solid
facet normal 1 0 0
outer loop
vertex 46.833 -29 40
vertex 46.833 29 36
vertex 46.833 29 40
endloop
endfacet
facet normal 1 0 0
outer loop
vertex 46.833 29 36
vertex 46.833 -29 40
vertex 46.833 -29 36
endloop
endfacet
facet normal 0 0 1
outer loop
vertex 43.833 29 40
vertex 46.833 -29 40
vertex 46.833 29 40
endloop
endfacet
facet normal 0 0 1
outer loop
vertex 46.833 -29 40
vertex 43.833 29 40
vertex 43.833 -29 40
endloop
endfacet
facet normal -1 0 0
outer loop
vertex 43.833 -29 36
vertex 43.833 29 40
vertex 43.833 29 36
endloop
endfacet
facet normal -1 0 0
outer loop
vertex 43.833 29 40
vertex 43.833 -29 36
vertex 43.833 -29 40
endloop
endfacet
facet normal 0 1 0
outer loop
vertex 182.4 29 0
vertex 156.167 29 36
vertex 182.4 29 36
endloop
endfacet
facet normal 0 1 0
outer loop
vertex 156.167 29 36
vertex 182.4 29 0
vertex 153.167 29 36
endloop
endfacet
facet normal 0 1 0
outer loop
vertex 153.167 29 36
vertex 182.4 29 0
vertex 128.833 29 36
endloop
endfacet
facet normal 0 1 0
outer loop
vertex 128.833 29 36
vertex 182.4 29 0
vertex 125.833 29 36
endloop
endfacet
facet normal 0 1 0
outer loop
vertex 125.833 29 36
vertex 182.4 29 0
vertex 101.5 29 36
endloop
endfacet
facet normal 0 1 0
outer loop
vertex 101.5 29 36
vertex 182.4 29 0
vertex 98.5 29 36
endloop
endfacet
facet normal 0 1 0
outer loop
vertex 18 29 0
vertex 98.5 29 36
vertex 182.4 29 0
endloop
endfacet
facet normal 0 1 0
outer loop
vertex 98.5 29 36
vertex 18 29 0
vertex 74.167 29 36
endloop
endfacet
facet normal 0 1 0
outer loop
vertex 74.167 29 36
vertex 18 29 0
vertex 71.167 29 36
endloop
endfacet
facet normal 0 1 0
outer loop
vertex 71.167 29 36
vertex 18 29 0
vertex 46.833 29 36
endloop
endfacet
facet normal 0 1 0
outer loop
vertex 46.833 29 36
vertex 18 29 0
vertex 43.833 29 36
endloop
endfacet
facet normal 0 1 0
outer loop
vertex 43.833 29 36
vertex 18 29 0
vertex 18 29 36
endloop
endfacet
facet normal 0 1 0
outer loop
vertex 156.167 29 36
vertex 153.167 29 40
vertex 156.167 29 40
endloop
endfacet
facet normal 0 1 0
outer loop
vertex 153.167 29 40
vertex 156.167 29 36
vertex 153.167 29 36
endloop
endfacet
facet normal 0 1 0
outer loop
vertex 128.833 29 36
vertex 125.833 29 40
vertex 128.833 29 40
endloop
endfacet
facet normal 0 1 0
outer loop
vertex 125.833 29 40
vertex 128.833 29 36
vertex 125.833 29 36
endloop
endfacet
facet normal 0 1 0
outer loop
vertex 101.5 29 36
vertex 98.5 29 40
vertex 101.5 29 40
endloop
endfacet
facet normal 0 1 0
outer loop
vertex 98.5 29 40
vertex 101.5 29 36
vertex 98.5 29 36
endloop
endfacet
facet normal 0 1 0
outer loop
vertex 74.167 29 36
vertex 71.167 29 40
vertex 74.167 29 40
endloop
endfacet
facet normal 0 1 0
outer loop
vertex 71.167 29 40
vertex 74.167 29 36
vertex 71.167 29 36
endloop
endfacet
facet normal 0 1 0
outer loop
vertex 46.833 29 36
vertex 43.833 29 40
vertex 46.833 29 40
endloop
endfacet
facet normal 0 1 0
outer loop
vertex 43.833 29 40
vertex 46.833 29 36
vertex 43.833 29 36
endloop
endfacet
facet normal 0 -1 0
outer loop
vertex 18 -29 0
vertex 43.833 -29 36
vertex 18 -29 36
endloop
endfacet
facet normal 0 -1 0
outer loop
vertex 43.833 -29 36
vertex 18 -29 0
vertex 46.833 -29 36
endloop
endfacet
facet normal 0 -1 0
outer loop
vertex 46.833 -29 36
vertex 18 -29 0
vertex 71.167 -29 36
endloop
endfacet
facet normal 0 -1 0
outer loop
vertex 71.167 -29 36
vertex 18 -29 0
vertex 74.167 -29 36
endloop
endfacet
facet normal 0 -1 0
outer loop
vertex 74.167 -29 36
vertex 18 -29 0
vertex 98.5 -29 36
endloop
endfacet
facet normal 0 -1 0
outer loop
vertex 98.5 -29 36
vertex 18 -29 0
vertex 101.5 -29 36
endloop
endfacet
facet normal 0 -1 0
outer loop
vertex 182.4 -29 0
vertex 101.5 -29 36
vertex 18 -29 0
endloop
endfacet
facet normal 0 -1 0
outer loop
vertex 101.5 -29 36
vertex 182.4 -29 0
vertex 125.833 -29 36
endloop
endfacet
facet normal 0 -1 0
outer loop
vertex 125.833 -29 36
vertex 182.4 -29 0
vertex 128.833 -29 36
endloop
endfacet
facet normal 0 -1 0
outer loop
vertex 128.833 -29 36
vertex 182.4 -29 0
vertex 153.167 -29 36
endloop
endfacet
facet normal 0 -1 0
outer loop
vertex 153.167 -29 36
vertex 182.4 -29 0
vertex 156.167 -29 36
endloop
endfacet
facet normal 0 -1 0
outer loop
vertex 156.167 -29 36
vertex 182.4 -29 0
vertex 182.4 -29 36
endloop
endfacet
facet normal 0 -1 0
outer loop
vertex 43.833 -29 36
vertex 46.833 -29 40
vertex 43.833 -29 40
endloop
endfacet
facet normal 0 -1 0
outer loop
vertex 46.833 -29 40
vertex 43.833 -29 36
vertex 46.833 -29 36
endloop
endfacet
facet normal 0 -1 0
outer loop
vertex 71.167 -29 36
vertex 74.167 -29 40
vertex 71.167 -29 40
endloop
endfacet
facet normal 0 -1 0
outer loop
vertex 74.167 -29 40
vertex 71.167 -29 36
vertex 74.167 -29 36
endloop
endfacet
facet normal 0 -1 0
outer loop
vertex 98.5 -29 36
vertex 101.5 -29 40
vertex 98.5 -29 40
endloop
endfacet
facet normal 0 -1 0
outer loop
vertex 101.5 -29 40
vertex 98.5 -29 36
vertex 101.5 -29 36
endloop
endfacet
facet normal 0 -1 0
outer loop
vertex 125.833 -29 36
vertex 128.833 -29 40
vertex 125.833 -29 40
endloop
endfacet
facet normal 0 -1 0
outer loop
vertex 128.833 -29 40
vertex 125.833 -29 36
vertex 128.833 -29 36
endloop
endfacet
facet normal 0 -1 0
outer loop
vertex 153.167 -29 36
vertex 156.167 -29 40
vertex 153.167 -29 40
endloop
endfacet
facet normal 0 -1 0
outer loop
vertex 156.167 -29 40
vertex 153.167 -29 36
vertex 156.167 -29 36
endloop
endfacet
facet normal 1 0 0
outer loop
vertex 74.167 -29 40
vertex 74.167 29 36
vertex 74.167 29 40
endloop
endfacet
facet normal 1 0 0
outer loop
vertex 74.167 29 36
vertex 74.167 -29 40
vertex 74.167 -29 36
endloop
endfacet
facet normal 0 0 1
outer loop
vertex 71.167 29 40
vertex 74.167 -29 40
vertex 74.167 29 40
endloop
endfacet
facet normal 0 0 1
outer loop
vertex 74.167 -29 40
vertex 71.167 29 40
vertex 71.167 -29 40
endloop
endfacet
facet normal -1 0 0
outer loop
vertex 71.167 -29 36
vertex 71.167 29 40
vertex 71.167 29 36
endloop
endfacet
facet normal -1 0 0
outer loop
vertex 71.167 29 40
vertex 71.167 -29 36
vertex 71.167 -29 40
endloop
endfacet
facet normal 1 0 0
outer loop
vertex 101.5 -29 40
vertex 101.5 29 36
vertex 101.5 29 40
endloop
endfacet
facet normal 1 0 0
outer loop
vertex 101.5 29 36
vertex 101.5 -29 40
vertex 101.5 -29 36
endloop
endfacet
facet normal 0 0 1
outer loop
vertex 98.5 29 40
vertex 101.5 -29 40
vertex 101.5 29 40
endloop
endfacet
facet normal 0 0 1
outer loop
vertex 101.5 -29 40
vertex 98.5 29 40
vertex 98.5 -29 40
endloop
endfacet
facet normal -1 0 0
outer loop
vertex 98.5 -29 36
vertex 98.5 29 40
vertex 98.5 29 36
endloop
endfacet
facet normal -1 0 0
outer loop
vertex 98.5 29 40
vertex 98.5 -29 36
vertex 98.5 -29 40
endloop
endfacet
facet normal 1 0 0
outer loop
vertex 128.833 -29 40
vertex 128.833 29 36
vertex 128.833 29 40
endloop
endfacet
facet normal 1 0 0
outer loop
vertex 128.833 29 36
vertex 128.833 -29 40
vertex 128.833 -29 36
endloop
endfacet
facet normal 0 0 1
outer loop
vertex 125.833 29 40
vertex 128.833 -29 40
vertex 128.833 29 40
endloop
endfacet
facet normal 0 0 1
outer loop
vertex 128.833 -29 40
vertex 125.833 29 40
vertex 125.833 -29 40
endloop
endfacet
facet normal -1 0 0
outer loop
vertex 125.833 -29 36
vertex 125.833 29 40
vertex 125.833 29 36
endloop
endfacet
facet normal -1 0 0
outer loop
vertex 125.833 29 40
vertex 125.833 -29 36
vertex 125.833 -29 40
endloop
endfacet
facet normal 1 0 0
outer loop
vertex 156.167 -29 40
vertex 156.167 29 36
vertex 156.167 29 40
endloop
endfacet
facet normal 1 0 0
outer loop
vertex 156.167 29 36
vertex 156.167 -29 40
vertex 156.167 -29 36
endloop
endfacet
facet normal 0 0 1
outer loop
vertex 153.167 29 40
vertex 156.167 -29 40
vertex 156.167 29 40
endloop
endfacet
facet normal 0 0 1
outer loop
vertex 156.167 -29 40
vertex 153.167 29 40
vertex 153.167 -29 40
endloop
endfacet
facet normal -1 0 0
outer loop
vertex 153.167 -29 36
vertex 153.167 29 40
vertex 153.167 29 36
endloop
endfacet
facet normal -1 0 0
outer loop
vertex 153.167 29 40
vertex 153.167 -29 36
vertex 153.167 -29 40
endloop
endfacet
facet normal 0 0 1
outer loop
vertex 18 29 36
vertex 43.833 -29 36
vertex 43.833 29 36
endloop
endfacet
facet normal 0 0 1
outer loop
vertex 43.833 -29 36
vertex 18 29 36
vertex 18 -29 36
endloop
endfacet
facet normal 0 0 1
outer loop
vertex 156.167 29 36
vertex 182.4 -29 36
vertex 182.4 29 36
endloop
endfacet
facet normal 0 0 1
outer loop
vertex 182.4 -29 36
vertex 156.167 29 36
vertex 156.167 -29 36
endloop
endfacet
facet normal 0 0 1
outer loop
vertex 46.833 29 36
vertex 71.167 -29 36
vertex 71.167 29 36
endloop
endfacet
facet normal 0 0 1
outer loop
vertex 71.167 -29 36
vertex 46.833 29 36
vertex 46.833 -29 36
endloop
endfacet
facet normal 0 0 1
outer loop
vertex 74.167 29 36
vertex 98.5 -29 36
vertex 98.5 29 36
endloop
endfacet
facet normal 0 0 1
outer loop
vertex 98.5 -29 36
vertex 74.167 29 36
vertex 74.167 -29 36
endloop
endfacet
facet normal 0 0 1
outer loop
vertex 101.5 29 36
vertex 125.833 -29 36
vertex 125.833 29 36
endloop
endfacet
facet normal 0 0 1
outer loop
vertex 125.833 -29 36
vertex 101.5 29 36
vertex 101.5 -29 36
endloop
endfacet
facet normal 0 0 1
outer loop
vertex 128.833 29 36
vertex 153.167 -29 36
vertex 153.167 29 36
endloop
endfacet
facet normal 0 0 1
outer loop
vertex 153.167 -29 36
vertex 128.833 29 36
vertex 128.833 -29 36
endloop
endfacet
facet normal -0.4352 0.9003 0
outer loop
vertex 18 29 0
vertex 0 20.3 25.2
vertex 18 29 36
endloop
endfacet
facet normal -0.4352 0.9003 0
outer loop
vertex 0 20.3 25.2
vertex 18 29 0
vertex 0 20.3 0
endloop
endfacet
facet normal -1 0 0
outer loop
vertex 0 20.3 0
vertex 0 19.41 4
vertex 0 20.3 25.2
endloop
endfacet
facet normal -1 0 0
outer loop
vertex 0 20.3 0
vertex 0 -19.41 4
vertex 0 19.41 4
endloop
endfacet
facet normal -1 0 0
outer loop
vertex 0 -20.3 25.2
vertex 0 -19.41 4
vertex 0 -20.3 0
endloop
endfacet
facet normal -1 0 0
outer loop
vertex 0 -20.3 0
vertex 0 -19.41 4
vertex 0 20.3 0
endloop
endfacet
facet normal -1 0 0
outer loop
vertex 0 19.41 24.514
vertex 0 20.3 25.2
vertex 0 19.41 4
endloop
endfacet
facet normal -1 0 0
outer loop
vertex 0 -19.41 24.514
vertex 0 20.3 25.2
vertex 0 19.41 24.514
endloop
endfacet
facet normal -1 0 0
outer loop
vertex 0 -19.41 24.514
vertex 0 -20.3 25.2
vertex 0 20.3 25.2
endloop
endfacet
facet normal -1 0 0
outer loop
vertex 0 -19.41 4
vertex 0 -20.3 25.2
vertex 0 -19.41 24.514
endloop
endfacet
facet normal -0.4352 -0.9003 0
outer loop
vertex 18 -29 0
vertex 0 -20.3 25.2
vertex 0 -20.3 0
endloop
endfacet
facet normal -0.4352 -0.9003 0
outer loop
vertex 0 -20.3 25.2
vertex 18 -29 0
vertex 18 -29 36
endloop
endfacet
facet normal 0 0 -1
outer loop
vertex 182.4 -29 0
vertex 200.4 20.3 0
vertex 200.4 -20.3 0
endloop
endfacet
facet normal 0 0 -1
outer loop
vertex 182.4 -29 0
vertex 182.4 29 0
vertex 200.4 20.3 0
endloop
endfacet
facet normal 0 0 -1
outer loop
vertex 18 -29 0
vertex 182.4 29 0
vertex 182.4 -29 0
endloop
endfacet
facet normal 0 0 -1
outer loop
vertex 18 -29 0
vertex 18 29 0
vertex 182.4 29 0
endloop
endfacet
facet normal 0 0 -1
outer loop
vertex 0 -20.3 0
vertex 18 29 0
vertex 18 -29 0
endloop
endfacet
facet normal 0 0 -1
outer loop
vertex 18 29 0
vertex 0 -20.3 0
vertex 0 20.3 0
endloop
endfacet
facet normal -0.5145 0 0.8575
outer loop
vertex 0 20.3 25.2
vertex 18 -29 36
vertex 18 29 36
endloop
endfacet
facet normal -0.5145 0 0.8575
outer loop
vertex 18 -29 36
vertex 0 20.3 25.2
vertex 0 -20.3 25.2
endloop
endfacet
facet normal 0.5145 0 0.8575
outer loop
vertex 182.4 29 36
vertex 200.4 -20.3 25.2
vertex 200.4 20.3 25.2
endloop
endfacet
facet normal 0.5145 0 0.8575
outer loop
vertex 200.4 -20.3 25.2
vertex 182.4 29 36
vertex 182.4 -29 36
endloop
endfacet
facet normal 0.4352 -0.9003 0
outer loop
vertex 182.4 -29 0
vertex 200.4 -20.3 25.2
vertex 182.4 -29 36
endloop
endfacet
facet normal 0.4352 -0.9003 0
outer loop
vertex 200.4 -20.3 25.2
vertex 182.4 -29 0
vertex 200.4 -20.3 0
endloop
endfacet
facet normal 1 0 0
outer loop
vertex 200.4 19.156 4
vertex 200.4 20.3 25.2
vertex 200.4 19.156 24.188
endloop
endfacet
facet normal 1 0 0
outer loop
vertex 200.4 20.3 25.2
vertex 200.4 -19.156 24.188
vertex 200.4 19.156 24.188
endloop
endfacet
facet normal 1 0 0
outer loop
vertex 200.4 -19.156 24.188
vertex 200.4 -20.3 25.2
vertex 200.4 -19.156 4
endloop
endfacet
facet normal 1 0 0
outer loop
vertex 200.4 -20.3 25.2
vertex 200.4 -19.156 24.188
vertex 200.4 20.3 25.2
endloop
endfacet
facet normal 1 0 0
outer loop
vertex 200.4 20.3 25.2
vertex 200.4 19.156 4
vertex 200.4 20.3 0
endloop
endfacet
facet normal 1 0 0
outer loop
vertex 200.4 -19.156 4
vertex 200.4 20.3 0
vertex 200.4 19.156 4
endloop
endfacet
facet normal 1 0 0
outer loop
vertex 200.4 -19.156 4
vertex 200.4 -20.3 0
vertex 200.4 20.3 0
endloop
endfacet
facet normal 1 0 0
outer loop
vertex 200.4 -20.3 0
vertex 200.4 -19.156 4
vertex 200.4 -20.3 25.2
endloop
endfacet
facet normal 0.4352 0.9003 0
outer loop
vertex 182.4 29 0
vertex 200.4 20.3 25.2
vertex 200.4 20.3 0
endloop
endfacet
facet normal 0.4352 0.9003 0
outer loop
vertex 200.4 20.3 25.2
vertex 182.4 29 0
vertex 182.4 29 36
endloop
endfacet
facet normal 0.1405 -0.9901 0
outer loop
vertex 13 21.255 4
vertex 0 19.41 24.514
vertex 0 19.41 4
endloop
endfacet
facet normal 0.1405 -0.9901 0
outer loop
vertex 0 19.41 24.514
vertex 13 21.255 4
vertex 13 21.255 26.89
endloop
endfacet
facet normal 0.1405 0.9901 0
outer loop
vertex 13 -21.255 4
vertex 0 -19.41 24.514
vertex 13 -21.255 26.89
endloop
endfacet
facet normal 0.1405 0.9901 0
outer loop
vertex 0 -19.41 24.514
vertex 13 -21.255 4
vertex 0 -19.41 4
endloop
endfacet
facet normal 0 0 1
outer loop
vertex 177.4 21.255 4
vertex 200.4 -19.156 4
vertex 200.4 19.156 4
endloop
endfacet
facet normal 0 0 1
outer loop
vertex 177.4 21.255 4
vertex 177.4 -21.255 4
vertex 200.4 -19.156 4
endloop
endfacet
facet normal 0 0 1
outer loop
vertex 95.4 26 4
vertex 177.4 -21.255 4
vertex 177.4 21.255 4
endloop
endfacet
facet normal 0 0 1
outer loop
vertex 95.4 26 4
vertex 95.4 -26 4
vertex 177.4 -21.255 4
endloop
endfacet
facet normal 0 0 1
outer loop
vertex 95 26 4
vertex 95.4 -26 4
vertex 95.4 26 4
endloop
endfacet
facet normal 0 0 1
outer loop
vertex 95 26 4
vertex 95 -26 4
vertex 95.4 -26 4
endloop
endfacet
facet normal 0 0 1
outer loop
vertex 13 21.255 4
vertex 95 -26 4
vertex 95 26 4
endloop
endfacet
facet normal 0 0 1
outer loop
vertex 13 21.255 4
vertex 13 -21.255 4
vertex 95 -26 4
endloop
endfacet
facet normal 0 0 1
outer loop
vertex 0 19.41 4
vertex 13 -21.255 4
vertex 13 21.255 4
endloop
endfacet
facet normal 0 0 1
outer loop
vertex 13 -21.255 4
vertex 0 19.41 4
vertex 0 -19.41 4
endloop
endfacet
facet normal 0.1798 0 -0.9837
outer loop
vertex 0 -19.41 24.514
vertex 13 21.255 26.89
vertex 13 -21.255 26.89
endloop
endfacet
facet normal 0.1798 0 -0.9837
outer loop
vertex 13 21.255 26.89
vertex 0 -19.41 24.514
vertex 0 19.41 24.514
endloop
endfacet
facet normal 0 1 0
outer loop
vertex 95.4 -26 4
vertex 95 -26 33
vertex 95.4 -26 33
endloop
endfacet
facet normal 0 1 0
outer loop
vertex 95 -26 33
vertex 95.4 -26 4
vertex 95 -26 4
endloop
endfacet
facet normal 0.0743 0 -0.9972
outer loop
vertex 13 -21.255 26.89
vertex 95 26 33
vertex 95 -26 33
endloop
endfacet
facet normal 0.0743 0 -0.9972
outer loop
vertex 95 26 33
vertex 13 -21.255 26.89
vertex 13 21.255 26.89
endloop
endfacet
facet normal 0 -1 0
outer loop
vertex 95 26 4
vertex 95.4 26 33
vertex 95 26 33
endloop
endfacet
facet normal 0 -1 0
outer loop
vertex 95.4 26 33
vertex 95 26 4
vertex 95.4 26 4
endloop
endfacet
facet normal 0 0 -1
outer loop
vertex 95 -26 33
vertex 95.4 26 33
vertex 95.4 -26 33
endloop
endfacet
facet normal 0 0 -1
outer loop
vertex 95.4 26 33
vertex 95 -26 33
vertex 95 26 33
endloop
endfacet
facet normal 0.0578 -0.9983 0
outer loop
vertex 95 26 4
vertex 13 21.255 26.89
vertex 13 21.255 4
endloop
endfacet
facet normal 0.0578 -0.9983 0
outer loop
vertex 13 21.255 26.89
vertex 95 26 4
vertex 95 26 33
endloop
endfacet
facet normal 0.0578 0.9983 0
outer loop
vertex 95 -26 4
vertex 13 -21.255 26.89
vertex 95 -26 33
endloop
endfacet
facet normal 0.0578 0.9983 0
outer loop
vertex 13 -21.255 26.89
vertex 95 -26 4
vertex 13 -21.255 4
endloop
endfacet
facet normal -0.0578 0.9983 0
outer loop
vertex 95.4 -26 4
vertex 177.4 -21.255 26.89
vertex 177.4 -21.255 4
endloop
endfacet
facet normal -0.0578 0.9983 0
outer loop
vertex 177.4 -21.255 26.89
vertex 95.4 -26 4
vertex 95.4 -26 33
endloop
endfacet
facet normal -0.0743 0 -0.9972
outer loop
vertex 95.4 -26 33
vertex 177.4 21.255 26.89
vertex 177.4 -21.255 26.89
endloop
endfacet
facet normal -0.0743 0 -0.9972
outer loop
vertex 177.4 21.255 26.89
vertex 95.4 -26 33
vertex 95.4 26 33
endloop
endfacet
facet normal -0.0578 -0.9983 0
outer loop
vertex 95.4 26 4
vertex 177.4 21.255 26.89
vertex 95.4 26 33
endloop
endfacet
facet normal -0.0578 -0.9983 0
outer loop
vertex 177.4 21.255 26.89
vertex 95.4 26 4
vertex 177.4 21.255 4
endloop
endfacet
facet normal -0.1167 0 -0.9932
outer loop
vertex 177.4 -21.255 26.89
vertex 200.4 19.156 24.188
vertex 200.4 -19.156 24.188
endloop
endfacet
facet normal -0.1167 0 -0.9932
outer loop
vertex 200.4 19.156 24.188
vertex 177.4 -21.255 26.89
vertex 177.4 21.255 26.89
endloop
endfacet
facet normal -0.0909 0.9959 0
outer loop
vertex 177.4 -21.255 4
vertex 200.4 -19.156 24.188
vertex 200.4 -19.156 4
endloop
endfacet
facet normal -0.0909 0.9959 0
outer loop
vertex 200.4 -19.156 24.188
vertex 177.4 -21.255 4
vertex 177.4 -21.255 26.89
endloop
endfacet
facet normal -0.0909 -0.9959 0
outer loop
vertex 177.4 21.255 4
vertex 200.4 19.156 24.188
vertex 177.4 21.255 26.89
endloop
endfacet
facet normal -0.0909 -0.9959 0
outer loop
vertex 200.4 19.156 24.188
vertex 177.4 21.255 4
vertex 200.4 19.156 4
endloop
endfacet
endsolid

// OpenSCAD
$fn = 32;

// ----------------------------------------------------------------------
// Faired channel: 200 x 58 x 36 mm, 3 mm walls, faired ends
// ----------------------------------------------------------------------

// --- parameters (mm) ---
length = 200;             // channel length
width = 58;               // channel width at mid length
height = 36;              // channel height at mid length
wall = 3;                 // side wall thickness
floor_t = 4;              // floor thickness
end_w = 40.6;             // faired end width
end_h = 25.2;             // faired end height
ribs = 5;                 // stiffening ribs on the top
rib_t = 3;                // rib thickness
rib_h = 4;                // rib height

difference() {
  union() {
    hull() {
      translate([0, -20.3, 0]) cube([0.4, 40.6, 25.2]);
      translate([18, -29, 0]) cube([0.4, 58, 36]);
    }
    hull() {
      translate([18, -29, 0]) cube([0.4, 58, 36]);
      translate([100, -29, 0]) cube([0.4, 58, 36]);
    }
    hull() {
      translate([100, -29, 0]) cube([0.4, 58, 36]);
      translate([182, -29, 0]) cube([0.4, 58, 36]);
    }
    hull() {
      translate([182, -29, 0]) cube([0.4, 58, 36]);
      translate([200, -20.3, 0]) cube([0.4, 40.6, 25.2]);
    }
    /* stiffening ribs across the flat top, sunk 0.8 mm into it */
    for (i = [1 : ribs]) {
      translate([18 + i * (length - 2 * 18) / (ribs + 1) - rib_t / 2, -width / 2, height - 0.8]) cube([rib_t, width, rib_h + 0.8]);
    }
  }
  /* cavity, 5 mm proud of both ends so the ports are cut clean */
  hull() {
    translate([-5, -18.7, 4]) cube([0.4, 37.4, 19.6]);
    translate([13, -21.255, 4]) cube([0.4, 42.51, 22.89]);
  }
  hull() {
    translate([13, -21.255, 4]) cube([0.4, 42.51, 22.89]);
    translate([95, -26, 4]) cube([0.4, 52, 29]);
  }
  hull() {
    translate([95, -26, 4]) cube([0.4, 52, 29]);
    translate([177, -21.255, 4]) cube([0.4, 42.51, 22.89]);
  }
  hull() {
    translate([177, -21.255, 4]) cube([0.4, 42.51, 22.89]);
    translate([205, -18.7, 4]) cube([0.4, 37.4, 19.6]);
  }
}
